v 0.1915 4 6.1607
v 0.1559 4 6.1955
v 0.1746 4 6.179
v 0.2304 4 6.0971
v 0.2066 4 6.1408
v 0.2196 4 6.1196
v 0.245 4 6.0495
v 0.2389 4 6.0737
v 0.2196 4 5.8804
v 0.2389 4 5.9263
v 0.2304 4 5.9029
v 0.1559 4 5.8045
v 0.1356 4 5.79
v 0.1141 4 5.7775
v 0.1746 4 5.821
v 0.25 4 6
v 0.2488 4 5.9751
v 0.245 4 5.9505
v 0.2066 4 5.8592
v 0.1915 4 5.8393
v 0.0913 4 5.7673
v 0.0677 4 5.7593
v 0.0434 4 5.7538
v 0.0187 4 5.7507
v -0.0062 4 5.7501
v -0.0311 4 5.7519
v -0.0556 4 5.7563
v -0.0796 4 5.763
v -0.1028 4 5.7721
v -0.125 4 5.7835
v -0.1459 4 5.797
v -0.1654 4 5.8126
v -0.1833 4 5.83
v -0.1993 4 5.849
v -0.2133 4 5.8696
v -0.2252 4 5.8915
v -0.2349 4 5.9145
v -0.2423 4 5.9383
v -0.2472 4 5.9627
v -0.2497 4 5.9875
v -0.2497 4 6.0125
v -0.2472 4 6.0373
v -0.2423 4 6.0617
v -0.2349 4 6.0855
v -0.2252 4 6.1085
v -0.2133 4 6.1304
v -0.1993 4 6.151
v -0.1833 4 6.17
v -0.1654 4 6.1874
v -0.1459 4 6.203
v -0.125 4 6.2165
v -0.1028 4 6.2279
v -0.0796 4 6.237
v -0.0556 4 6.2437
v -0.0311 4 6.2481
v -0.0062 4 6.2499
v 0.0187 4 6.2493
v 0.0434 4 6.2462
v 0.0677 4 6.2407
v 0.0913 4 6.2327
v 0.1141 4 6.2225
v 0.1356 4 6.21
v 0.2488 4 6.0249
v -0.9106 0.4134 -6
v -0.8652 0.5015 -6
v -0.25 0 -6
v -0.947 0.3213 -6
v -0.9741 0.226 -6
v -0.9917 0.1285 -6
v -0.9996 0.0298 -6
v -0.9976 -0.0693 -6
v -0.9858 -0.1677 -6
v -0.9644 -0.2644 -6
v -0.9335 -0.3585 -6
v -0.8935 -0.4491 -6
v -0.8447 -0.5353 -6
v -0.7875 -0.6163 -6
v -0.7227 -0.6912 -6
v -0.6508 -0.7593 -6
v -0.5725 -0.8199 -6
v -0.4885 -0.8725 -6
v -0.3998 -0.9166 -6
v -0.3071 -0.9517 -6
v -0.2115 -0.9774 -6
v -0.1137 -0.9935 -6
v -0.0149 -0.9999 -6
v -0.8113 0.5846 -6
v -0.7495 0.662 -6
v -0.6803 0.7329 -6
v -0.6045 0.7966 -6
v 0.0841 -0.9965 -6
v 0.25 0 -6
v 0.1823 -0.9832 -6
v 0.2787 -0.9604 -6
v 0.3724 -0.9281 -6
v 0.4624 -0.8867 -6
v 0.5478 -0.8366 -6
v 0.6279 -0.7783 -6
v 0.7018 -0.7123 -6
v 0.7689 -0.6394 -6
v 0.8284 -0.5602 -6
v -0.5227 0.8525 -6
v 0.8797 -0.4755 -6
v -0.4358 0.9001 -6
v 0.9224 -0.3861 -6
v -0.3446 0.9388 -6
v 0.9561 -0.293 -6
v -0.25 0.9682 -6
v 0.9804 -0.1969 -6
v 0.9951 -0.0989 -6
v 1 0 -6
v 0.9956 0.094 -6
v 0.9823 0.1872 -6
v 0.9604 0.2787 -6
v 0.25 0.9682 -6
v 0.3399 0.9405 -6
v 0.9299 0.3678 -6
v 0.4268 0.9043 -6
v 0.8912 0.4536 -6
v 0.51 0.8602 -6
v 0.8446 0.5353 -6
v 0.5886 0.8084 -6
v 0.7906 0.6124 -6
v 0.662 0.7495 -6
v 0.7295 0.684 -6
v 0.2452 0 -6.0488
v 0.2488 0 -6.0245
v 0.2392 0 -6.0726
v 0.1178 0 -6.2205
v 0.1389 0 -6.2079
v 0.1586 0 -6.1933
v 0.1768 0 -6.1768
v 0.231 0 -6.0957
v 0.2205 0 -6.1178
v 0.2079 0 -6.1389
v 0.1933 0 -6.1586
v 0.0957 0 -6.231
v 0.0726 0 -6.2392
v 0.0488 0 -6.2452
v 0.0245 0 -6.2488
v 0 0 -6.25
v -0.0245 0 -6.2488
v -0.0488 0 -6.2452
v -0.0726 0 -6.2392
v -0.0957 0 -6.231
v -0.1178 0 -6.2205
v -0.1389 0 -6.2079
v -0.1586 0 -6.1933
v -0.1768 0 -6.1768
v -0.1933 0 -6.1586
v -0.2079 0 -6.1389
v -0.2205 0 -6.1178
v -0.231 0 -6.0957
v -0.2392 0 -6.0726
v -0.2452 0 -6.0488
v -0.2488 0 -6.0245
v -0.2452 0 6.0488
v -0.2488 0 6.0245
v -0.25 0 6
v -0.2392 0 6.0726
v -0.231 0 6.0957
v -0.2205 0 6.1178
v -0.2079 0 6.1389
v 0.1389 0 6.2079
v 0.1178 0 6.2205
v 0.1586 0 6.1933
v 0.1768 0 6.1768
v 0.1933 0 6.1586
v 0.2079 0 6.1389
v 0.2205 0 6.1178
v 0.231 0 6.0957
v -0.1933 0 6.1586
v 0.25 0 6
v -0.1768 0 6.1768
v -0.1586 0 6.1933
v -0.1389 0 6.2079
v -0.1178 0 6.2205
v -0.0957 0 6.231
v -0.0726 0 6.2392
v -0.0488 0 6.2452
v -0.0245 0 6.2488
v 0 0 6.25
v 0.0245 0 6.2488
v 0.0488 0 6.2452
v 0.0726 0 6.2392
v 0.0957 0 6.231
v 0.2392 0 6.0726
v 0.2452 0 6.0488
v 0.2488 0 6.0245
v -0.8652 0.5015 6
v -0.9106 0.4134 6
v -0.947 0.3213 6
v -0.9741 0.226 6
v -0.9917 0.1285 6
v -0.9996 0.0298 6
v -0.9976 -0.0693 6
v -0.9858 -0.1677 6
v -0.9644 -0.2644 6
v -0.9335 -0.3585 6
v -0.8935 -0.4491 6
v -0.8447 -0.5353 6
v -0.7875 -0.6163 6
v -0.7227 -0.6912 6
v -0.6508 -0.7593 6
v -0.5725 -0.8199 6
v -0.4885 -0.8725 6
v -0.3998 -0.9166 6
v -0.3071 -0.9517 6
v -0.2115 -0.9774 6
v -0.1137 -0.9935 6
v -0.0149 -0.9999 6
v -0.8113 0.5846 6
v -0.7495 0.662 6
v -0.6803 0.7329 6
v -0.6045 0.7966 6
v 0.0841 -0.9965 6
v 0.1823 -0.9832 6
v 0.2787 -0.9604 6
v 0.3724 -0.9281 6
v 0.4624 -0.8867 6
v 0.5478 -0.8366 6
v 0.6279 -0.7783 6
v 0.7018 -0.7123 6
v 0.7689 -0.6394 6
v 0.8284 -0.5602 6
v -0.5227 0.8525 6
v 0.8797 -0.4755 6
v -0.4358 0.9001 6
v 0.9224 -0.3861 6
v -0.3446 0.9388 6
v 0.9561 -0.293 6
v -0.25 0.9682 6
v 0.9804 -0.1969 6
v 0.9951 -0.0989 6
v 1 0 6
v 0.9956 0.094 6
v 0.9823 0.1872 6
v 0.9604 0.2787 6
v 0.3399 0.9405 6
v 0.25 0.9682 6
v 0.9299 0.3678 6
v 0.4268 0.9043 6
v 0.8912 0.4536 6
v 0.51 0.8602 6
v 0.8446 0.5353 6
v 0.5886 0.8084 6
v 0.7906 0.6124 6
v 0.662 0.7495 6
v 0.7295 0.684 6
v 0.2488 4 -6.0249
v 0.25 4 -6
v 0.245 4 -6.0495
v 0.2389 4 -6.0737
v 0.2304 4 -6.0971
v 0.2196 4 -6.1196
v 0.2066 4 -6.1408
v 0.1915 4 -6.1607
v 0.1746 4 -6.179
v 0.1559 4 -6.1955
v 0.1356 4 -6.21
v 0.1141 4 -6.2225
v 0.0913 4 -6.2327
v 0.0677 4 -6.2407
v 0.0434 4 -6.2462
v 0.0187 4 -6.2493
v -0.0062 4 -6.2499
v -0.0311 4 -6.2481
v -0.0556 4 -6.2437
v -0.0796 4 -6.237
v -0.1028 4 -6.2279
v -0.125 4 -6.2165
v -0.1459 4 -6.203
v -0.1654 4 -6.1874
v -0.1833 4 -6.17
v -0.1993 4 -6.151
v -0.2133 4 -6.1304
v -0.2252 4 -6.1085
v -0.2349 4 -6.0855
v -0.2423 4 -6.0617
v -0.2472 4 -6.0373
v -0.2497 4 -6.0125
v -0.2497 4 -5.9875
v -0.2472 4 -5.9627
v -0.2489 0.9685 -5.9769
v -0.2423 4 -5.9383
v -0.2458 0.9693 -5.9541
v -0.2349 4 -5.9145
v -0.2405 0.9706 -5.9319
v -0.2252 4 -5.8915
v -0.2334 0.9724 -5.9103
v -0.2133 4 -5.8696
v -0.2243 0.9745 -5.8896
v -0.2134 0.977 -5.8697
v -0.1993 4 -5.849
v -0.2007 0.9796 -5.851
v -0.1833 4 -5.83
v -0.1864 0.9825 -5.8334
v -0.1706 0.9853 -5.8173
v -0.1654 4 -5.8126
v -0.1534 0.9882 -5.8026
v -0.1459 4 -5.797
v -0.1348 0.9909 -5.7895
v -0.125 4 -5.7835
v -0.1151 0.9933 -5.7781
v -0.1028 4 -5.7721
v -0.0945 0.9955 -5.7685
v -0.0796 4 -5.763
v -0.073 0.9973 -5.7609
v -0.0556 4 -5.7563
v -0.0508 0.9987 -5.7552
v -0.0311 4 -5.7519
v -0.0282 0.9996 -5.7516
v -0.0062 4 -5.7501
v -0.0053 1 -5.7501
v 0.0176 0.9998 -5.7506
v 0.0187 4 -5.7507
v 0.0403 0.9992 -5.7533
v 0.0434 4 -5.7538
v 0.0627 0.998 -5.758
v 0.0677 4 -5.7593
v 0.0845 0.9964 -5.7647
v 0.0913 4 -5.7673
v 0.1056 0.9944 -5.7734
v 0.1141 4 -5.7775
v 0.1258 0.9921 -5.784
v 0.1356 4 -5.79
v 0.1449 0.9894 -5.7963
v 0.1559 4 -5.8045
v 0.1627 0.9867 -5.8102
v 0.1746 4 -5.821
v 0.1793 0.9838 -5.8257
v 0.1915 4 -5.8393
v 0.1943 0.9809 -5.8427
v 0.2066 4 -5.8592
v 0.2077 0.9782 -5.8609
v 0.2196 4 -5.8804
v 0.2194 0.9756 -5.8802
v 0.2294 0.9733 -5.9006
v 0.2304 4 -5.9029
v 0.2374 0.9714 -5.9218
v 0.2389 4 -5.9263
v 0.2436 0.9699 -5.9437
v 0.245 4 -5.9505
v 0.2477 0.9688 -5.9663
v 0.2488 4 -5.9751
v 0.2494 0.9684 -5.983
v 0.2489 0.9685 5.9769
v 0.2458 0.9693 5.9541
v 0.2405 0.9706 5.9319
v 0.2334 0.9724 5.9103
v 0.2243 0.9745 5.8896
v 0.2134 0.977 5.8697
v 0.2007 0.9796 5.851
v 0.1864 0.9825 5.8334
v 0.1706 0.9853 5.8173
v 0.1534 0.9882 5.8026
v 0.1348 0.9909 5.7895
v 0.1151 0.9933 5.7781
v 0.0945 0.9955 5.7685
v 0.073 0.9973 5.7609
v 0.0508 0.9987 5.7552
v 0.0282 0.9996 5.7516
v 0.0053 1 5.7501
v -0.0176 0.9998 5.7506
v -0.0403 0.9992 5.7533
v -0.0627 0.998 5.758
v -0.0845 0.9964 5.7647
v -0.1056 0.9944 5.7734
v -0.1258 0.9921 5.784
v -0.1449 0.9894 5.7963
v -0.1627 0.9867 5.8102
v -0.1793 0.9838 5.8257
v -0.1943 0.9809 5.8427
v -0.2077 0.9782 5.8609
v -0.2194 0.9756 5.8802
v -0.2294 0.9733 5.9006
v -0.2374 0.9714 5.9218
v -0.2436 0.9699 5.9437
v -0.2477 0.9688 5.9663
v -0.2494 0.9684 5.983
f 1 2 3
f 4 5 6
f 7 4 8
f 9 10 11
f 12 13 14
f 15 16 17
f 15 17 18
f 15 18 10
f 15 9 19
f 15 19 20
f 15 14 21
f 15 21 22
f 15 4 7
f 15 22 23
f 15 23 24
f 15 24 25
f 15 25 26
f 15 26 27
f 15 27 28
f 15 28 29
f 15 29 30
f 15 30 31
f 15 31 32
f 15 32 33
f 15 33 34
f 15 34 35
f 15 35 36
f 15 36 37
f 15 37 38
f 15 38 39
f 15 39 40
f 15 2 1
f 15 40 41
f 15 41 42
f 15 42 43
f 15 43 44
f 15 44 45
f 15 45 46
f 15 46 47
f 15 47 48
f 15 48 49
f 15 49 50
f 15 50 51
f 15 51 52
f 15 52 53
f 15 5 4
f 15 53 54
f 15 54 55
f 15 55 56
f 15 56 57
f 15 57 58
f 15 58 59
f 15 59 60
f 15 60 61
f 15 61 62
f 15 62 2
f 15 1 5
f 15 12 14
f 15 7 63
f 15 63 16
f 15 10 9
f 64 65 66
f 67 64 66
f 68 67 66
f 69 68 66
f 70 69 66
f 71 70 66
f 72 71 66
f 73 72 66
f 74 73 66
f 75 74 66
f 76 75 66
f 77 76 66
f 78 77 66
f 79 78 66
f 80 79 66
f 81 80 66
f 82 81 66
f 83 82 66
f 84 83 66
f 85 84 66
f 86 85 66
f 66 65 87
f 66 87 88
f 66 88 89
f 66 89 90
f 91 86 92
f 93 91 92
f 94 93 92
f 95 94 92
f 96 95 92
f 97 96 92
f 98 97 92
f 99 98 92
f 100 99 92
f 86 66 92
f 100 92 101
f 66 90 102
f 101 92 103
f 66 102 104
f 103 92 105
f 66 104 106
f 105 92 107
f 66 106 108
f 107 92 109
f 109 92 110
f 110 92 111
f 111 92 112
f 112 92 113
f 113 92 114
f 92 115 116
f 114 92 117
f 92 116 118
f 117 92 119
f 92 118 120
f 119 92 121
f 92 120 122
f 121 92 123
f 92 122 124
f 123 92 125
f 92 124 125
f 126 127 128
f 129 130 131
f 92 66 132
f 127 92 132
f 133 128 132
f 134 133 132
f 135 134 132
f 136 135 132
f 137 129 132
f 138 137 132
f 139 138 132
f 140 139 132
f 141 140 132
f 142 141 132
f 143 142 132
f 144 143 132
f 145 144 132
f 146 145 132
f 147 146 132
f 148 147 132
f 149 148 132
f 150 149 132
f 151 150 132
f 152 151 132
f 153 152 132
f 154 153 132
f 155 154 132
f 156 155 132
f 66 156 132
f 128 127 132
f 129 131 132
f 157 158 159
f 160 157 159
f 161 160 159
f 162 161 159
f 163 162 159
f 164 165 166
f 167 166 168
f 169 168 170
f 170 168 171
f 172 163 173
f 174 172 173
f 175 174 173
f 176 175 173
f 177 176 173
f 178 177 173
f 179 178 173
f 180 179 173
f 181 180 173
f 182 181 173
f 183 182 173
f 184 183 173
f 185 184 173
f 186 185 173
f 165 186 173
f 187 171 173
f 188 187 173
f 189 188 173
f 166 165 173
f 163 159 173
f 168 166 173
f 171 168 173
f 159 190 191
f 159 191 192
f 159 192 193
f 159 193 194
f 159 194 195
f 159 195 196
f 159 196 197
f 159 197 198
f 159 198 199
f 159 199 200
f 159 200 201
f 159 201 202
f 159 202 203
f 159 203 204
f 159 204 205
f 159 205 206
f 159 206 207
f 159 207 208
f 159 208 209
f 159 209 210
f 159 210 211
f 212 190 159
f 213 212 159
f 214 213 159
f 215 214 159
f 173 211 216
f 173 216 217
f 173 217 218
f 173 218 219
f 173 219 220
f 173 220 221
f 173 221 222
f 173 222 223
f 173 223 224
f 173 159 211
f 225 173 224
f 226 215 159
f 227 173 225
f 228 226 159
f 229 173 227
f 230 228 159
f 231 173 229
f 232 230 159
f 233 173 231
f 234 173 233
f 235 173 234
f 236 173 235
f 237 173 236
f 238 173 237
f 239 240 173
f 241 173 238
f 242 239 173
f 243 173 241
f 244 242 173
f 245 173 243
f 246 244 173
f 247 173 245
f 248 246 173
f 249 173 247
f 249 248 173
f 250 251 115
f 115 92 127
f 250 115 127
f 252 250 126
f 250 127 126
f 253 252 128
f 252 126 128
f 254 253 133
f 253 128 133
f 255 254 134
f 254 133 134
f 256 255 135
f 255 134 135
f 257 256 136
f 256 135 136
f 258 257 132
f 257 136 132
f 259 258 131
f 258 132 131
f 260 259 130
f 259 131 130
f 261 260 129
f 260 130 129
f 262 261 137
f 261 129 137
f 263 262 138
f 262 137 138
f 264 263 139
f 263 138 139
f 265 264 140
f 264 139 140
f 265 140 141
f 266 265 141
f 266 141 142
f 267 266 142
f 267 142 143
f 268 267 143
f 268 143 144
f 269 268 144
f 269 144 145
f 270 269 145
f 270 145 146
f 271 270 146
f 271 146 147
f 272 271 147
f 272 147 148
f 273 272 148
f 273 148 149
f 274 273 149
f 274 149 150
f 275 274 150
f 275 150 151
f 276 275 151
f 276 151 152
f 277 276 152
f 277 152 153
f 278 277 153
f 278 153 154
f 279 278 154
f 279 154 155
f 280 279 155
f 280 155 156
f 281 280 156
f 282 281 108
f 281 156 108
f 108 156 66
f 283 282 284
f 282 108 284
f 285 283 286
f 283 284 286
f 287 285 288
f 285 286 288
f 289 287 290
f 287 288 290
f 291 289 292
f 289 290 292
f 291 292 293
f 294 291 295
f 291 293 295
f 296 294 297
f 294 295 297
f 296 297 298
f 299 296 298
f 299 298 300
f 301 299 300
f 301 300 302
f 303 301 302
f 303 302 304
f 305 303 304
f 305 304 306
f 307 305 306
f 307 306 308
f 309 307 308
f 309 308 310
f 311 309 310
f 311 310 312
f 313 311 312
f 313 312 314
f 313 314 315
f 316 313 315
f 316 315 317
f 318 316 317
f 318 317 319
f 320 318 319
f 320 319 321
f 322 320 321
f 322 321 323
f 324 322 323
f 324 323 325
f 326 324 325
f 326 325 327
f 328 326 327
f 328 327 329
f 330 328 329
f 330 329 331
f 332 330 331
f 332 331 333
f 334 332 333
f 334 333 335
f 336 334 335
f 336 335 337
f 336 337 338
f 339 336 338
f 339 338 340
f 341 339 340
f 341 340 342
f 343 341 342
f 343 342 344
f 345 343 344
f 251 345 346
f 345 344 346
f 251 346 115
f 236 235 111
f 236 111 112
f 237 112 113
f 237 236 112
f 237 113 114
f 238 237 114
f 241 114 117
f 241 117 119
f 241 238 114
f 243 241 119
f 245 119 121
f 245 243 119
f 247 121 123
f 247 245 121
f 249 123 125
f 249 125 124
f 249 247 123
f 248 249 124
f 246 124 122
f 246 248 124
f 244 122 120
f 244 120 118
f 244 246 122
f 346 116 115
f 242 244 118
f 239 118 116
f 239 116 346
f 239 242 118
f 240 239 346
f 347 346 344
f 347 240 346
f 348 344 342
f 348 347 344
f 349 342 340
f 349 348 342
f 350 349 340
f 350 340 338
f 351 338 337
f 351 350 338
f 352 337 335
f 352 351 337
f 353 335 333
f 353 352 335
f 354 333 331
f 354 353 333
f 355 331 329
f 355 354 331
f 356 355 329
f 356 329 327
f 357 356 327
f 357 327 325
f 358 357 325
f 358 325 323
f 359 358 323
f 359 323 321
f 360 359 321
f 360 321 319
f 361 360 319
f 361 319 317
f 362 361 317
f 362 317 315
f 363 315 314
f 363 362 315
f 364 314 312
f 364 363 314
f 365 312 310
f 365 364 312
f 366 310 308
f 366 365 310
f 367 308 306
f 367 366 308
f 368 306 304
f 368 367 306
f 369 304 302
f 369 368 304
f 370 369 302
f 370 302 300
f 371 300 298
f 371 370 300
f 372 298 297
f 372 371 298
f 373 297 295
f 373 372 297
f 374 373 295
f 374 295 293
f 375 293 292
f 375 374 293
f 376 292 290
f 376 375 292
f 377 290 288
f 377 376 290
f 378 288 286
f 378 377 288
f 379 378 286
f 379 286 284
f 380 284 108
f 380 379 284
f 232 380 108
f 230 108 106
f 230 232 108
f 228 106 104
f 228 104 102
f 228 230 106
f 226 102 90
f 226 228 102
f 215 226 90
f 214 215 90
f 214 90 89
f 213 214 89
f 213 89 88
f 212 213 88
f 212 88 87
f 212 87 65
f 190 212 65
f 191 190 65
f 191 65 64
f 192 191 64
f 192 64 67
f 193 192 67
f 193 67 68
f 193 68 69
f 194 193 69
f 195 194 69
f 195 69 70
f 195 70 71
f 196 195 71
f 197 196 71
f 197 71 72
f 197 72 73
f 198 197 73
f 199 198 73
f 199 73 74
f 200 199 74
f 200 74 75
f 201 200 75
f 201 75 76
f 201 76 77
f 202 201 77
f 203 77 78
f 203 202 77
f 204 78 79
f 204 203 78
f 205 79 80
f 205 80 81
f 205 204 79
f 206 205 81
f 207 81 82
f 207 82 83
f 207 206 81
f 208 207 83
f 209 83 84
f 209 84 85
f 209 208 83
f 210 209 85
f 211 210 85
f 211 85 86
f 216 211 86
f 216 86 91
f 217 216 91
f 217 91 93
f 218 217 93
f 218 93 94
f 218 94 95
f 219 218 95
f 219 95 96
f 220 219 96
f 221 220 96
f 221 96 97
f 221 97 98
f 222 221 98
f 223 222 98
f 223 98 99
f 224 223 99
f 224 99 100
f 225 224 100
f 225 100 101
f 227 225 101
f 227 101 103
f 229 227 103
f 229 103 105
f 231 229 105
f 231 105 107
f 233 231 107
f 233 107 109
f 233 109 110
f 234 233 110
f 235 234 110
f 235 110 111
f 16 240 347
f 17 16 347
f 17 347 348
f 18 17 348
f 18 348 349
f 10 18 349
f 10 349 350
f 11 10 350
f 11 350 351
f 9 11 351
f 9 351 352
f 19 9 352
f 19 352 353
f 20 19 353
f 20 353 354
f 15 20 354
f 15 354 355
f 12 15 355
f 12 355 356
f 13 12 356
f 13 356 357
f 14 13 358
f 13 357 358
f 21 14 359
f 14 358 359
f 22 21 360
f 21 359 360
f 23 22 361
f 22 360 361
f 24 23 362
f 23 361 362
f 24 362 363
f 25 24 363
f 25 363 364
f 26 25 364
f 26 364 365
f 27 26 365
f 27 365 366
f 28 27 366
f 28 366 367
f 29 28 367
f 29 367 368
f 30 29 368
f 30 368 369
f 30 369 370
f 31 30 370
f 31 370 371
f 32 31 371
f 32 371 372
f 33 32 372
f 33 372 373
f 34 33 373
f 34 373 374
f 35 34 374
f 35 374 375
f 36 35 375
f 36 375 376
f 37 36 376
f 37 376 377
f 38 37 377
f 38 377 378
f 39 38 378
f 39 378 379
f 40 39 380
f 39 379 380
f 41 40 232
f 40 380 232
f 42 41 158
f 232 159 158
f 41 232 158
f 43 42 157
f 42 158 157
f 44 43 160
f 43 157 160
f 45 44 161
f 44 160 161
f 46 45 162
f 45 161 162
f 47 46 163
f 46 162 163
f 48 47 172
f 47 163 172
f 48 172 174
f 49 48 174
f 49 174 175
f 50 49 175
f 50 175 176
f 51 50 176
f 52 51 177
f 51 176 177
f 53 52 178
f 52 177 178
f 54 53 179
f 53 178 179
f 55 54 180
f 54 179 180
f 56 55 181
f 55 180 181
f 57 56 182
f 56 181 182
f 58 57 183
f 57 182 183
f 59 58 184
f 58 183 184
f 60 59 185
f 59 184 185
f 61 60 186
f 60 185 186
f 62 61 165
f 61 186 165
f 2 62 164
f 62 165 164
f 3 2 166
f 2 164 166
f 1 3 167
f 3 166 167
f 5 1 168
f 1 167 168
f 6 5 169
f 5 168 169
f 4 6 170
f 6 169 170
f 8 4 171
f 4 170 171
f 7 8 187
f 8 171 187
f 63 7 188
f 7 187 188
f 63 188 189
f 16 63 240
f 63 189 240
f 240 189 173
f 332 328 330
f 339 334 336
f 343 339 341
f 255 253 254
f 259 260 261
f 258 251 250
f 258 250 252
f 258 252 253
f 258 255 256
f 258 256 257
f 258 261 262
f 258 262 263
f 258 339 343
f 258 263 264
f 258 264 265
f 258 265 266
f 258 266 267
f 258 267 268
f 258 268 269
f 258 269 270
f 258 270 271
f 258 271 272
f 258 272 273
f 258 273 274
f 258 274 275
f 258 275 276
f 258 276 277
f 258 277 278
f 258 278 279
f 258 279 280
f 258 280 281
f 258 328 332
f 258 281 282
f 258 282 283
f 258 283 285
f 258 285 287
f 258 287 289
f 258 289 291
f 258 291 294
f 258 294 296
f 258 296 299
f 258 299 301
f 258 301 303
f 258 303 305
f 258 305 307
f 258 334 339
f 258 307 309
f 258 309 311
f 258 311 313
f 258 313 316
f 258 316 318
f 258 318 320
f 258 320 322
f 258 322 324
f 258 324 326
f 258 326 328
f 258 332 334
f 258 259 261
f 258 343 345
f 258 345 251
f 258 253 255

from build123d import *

# Parameters (mm, degrees)
SKETCH1_R           = 1
BOSS_EXTRUDE1_DEPTH = 6
SKETCH2_R           = 0.25
BOSS_EXTRUDE2_DEPTH = 4


with BuildPart() as part:
    # Sketch1 → Boss-Extrude1 (new body, symmetric)
    with BuildSketch(Plane.XY):
        Circle(SKETCH1_R)
    extrude(amount=BOSS_EXTRUDE1_DEPTH, both=True)

    # Sketch2 → Boss-Extrude2 (add)
    with BuildSketch(Plane(origin=(0, 0, 0), x_dir=(1, 0, 0), z_dir=(0, 1, 0))):
        with Locations((0, -6)):
            Circle(SKETCH2_R)
        with Locations((0, 6)):
            Circle(SKETCH2_R)
    extrude(amount=BOSS_EXTRUDE2_DEPTH)


solid = part.part
